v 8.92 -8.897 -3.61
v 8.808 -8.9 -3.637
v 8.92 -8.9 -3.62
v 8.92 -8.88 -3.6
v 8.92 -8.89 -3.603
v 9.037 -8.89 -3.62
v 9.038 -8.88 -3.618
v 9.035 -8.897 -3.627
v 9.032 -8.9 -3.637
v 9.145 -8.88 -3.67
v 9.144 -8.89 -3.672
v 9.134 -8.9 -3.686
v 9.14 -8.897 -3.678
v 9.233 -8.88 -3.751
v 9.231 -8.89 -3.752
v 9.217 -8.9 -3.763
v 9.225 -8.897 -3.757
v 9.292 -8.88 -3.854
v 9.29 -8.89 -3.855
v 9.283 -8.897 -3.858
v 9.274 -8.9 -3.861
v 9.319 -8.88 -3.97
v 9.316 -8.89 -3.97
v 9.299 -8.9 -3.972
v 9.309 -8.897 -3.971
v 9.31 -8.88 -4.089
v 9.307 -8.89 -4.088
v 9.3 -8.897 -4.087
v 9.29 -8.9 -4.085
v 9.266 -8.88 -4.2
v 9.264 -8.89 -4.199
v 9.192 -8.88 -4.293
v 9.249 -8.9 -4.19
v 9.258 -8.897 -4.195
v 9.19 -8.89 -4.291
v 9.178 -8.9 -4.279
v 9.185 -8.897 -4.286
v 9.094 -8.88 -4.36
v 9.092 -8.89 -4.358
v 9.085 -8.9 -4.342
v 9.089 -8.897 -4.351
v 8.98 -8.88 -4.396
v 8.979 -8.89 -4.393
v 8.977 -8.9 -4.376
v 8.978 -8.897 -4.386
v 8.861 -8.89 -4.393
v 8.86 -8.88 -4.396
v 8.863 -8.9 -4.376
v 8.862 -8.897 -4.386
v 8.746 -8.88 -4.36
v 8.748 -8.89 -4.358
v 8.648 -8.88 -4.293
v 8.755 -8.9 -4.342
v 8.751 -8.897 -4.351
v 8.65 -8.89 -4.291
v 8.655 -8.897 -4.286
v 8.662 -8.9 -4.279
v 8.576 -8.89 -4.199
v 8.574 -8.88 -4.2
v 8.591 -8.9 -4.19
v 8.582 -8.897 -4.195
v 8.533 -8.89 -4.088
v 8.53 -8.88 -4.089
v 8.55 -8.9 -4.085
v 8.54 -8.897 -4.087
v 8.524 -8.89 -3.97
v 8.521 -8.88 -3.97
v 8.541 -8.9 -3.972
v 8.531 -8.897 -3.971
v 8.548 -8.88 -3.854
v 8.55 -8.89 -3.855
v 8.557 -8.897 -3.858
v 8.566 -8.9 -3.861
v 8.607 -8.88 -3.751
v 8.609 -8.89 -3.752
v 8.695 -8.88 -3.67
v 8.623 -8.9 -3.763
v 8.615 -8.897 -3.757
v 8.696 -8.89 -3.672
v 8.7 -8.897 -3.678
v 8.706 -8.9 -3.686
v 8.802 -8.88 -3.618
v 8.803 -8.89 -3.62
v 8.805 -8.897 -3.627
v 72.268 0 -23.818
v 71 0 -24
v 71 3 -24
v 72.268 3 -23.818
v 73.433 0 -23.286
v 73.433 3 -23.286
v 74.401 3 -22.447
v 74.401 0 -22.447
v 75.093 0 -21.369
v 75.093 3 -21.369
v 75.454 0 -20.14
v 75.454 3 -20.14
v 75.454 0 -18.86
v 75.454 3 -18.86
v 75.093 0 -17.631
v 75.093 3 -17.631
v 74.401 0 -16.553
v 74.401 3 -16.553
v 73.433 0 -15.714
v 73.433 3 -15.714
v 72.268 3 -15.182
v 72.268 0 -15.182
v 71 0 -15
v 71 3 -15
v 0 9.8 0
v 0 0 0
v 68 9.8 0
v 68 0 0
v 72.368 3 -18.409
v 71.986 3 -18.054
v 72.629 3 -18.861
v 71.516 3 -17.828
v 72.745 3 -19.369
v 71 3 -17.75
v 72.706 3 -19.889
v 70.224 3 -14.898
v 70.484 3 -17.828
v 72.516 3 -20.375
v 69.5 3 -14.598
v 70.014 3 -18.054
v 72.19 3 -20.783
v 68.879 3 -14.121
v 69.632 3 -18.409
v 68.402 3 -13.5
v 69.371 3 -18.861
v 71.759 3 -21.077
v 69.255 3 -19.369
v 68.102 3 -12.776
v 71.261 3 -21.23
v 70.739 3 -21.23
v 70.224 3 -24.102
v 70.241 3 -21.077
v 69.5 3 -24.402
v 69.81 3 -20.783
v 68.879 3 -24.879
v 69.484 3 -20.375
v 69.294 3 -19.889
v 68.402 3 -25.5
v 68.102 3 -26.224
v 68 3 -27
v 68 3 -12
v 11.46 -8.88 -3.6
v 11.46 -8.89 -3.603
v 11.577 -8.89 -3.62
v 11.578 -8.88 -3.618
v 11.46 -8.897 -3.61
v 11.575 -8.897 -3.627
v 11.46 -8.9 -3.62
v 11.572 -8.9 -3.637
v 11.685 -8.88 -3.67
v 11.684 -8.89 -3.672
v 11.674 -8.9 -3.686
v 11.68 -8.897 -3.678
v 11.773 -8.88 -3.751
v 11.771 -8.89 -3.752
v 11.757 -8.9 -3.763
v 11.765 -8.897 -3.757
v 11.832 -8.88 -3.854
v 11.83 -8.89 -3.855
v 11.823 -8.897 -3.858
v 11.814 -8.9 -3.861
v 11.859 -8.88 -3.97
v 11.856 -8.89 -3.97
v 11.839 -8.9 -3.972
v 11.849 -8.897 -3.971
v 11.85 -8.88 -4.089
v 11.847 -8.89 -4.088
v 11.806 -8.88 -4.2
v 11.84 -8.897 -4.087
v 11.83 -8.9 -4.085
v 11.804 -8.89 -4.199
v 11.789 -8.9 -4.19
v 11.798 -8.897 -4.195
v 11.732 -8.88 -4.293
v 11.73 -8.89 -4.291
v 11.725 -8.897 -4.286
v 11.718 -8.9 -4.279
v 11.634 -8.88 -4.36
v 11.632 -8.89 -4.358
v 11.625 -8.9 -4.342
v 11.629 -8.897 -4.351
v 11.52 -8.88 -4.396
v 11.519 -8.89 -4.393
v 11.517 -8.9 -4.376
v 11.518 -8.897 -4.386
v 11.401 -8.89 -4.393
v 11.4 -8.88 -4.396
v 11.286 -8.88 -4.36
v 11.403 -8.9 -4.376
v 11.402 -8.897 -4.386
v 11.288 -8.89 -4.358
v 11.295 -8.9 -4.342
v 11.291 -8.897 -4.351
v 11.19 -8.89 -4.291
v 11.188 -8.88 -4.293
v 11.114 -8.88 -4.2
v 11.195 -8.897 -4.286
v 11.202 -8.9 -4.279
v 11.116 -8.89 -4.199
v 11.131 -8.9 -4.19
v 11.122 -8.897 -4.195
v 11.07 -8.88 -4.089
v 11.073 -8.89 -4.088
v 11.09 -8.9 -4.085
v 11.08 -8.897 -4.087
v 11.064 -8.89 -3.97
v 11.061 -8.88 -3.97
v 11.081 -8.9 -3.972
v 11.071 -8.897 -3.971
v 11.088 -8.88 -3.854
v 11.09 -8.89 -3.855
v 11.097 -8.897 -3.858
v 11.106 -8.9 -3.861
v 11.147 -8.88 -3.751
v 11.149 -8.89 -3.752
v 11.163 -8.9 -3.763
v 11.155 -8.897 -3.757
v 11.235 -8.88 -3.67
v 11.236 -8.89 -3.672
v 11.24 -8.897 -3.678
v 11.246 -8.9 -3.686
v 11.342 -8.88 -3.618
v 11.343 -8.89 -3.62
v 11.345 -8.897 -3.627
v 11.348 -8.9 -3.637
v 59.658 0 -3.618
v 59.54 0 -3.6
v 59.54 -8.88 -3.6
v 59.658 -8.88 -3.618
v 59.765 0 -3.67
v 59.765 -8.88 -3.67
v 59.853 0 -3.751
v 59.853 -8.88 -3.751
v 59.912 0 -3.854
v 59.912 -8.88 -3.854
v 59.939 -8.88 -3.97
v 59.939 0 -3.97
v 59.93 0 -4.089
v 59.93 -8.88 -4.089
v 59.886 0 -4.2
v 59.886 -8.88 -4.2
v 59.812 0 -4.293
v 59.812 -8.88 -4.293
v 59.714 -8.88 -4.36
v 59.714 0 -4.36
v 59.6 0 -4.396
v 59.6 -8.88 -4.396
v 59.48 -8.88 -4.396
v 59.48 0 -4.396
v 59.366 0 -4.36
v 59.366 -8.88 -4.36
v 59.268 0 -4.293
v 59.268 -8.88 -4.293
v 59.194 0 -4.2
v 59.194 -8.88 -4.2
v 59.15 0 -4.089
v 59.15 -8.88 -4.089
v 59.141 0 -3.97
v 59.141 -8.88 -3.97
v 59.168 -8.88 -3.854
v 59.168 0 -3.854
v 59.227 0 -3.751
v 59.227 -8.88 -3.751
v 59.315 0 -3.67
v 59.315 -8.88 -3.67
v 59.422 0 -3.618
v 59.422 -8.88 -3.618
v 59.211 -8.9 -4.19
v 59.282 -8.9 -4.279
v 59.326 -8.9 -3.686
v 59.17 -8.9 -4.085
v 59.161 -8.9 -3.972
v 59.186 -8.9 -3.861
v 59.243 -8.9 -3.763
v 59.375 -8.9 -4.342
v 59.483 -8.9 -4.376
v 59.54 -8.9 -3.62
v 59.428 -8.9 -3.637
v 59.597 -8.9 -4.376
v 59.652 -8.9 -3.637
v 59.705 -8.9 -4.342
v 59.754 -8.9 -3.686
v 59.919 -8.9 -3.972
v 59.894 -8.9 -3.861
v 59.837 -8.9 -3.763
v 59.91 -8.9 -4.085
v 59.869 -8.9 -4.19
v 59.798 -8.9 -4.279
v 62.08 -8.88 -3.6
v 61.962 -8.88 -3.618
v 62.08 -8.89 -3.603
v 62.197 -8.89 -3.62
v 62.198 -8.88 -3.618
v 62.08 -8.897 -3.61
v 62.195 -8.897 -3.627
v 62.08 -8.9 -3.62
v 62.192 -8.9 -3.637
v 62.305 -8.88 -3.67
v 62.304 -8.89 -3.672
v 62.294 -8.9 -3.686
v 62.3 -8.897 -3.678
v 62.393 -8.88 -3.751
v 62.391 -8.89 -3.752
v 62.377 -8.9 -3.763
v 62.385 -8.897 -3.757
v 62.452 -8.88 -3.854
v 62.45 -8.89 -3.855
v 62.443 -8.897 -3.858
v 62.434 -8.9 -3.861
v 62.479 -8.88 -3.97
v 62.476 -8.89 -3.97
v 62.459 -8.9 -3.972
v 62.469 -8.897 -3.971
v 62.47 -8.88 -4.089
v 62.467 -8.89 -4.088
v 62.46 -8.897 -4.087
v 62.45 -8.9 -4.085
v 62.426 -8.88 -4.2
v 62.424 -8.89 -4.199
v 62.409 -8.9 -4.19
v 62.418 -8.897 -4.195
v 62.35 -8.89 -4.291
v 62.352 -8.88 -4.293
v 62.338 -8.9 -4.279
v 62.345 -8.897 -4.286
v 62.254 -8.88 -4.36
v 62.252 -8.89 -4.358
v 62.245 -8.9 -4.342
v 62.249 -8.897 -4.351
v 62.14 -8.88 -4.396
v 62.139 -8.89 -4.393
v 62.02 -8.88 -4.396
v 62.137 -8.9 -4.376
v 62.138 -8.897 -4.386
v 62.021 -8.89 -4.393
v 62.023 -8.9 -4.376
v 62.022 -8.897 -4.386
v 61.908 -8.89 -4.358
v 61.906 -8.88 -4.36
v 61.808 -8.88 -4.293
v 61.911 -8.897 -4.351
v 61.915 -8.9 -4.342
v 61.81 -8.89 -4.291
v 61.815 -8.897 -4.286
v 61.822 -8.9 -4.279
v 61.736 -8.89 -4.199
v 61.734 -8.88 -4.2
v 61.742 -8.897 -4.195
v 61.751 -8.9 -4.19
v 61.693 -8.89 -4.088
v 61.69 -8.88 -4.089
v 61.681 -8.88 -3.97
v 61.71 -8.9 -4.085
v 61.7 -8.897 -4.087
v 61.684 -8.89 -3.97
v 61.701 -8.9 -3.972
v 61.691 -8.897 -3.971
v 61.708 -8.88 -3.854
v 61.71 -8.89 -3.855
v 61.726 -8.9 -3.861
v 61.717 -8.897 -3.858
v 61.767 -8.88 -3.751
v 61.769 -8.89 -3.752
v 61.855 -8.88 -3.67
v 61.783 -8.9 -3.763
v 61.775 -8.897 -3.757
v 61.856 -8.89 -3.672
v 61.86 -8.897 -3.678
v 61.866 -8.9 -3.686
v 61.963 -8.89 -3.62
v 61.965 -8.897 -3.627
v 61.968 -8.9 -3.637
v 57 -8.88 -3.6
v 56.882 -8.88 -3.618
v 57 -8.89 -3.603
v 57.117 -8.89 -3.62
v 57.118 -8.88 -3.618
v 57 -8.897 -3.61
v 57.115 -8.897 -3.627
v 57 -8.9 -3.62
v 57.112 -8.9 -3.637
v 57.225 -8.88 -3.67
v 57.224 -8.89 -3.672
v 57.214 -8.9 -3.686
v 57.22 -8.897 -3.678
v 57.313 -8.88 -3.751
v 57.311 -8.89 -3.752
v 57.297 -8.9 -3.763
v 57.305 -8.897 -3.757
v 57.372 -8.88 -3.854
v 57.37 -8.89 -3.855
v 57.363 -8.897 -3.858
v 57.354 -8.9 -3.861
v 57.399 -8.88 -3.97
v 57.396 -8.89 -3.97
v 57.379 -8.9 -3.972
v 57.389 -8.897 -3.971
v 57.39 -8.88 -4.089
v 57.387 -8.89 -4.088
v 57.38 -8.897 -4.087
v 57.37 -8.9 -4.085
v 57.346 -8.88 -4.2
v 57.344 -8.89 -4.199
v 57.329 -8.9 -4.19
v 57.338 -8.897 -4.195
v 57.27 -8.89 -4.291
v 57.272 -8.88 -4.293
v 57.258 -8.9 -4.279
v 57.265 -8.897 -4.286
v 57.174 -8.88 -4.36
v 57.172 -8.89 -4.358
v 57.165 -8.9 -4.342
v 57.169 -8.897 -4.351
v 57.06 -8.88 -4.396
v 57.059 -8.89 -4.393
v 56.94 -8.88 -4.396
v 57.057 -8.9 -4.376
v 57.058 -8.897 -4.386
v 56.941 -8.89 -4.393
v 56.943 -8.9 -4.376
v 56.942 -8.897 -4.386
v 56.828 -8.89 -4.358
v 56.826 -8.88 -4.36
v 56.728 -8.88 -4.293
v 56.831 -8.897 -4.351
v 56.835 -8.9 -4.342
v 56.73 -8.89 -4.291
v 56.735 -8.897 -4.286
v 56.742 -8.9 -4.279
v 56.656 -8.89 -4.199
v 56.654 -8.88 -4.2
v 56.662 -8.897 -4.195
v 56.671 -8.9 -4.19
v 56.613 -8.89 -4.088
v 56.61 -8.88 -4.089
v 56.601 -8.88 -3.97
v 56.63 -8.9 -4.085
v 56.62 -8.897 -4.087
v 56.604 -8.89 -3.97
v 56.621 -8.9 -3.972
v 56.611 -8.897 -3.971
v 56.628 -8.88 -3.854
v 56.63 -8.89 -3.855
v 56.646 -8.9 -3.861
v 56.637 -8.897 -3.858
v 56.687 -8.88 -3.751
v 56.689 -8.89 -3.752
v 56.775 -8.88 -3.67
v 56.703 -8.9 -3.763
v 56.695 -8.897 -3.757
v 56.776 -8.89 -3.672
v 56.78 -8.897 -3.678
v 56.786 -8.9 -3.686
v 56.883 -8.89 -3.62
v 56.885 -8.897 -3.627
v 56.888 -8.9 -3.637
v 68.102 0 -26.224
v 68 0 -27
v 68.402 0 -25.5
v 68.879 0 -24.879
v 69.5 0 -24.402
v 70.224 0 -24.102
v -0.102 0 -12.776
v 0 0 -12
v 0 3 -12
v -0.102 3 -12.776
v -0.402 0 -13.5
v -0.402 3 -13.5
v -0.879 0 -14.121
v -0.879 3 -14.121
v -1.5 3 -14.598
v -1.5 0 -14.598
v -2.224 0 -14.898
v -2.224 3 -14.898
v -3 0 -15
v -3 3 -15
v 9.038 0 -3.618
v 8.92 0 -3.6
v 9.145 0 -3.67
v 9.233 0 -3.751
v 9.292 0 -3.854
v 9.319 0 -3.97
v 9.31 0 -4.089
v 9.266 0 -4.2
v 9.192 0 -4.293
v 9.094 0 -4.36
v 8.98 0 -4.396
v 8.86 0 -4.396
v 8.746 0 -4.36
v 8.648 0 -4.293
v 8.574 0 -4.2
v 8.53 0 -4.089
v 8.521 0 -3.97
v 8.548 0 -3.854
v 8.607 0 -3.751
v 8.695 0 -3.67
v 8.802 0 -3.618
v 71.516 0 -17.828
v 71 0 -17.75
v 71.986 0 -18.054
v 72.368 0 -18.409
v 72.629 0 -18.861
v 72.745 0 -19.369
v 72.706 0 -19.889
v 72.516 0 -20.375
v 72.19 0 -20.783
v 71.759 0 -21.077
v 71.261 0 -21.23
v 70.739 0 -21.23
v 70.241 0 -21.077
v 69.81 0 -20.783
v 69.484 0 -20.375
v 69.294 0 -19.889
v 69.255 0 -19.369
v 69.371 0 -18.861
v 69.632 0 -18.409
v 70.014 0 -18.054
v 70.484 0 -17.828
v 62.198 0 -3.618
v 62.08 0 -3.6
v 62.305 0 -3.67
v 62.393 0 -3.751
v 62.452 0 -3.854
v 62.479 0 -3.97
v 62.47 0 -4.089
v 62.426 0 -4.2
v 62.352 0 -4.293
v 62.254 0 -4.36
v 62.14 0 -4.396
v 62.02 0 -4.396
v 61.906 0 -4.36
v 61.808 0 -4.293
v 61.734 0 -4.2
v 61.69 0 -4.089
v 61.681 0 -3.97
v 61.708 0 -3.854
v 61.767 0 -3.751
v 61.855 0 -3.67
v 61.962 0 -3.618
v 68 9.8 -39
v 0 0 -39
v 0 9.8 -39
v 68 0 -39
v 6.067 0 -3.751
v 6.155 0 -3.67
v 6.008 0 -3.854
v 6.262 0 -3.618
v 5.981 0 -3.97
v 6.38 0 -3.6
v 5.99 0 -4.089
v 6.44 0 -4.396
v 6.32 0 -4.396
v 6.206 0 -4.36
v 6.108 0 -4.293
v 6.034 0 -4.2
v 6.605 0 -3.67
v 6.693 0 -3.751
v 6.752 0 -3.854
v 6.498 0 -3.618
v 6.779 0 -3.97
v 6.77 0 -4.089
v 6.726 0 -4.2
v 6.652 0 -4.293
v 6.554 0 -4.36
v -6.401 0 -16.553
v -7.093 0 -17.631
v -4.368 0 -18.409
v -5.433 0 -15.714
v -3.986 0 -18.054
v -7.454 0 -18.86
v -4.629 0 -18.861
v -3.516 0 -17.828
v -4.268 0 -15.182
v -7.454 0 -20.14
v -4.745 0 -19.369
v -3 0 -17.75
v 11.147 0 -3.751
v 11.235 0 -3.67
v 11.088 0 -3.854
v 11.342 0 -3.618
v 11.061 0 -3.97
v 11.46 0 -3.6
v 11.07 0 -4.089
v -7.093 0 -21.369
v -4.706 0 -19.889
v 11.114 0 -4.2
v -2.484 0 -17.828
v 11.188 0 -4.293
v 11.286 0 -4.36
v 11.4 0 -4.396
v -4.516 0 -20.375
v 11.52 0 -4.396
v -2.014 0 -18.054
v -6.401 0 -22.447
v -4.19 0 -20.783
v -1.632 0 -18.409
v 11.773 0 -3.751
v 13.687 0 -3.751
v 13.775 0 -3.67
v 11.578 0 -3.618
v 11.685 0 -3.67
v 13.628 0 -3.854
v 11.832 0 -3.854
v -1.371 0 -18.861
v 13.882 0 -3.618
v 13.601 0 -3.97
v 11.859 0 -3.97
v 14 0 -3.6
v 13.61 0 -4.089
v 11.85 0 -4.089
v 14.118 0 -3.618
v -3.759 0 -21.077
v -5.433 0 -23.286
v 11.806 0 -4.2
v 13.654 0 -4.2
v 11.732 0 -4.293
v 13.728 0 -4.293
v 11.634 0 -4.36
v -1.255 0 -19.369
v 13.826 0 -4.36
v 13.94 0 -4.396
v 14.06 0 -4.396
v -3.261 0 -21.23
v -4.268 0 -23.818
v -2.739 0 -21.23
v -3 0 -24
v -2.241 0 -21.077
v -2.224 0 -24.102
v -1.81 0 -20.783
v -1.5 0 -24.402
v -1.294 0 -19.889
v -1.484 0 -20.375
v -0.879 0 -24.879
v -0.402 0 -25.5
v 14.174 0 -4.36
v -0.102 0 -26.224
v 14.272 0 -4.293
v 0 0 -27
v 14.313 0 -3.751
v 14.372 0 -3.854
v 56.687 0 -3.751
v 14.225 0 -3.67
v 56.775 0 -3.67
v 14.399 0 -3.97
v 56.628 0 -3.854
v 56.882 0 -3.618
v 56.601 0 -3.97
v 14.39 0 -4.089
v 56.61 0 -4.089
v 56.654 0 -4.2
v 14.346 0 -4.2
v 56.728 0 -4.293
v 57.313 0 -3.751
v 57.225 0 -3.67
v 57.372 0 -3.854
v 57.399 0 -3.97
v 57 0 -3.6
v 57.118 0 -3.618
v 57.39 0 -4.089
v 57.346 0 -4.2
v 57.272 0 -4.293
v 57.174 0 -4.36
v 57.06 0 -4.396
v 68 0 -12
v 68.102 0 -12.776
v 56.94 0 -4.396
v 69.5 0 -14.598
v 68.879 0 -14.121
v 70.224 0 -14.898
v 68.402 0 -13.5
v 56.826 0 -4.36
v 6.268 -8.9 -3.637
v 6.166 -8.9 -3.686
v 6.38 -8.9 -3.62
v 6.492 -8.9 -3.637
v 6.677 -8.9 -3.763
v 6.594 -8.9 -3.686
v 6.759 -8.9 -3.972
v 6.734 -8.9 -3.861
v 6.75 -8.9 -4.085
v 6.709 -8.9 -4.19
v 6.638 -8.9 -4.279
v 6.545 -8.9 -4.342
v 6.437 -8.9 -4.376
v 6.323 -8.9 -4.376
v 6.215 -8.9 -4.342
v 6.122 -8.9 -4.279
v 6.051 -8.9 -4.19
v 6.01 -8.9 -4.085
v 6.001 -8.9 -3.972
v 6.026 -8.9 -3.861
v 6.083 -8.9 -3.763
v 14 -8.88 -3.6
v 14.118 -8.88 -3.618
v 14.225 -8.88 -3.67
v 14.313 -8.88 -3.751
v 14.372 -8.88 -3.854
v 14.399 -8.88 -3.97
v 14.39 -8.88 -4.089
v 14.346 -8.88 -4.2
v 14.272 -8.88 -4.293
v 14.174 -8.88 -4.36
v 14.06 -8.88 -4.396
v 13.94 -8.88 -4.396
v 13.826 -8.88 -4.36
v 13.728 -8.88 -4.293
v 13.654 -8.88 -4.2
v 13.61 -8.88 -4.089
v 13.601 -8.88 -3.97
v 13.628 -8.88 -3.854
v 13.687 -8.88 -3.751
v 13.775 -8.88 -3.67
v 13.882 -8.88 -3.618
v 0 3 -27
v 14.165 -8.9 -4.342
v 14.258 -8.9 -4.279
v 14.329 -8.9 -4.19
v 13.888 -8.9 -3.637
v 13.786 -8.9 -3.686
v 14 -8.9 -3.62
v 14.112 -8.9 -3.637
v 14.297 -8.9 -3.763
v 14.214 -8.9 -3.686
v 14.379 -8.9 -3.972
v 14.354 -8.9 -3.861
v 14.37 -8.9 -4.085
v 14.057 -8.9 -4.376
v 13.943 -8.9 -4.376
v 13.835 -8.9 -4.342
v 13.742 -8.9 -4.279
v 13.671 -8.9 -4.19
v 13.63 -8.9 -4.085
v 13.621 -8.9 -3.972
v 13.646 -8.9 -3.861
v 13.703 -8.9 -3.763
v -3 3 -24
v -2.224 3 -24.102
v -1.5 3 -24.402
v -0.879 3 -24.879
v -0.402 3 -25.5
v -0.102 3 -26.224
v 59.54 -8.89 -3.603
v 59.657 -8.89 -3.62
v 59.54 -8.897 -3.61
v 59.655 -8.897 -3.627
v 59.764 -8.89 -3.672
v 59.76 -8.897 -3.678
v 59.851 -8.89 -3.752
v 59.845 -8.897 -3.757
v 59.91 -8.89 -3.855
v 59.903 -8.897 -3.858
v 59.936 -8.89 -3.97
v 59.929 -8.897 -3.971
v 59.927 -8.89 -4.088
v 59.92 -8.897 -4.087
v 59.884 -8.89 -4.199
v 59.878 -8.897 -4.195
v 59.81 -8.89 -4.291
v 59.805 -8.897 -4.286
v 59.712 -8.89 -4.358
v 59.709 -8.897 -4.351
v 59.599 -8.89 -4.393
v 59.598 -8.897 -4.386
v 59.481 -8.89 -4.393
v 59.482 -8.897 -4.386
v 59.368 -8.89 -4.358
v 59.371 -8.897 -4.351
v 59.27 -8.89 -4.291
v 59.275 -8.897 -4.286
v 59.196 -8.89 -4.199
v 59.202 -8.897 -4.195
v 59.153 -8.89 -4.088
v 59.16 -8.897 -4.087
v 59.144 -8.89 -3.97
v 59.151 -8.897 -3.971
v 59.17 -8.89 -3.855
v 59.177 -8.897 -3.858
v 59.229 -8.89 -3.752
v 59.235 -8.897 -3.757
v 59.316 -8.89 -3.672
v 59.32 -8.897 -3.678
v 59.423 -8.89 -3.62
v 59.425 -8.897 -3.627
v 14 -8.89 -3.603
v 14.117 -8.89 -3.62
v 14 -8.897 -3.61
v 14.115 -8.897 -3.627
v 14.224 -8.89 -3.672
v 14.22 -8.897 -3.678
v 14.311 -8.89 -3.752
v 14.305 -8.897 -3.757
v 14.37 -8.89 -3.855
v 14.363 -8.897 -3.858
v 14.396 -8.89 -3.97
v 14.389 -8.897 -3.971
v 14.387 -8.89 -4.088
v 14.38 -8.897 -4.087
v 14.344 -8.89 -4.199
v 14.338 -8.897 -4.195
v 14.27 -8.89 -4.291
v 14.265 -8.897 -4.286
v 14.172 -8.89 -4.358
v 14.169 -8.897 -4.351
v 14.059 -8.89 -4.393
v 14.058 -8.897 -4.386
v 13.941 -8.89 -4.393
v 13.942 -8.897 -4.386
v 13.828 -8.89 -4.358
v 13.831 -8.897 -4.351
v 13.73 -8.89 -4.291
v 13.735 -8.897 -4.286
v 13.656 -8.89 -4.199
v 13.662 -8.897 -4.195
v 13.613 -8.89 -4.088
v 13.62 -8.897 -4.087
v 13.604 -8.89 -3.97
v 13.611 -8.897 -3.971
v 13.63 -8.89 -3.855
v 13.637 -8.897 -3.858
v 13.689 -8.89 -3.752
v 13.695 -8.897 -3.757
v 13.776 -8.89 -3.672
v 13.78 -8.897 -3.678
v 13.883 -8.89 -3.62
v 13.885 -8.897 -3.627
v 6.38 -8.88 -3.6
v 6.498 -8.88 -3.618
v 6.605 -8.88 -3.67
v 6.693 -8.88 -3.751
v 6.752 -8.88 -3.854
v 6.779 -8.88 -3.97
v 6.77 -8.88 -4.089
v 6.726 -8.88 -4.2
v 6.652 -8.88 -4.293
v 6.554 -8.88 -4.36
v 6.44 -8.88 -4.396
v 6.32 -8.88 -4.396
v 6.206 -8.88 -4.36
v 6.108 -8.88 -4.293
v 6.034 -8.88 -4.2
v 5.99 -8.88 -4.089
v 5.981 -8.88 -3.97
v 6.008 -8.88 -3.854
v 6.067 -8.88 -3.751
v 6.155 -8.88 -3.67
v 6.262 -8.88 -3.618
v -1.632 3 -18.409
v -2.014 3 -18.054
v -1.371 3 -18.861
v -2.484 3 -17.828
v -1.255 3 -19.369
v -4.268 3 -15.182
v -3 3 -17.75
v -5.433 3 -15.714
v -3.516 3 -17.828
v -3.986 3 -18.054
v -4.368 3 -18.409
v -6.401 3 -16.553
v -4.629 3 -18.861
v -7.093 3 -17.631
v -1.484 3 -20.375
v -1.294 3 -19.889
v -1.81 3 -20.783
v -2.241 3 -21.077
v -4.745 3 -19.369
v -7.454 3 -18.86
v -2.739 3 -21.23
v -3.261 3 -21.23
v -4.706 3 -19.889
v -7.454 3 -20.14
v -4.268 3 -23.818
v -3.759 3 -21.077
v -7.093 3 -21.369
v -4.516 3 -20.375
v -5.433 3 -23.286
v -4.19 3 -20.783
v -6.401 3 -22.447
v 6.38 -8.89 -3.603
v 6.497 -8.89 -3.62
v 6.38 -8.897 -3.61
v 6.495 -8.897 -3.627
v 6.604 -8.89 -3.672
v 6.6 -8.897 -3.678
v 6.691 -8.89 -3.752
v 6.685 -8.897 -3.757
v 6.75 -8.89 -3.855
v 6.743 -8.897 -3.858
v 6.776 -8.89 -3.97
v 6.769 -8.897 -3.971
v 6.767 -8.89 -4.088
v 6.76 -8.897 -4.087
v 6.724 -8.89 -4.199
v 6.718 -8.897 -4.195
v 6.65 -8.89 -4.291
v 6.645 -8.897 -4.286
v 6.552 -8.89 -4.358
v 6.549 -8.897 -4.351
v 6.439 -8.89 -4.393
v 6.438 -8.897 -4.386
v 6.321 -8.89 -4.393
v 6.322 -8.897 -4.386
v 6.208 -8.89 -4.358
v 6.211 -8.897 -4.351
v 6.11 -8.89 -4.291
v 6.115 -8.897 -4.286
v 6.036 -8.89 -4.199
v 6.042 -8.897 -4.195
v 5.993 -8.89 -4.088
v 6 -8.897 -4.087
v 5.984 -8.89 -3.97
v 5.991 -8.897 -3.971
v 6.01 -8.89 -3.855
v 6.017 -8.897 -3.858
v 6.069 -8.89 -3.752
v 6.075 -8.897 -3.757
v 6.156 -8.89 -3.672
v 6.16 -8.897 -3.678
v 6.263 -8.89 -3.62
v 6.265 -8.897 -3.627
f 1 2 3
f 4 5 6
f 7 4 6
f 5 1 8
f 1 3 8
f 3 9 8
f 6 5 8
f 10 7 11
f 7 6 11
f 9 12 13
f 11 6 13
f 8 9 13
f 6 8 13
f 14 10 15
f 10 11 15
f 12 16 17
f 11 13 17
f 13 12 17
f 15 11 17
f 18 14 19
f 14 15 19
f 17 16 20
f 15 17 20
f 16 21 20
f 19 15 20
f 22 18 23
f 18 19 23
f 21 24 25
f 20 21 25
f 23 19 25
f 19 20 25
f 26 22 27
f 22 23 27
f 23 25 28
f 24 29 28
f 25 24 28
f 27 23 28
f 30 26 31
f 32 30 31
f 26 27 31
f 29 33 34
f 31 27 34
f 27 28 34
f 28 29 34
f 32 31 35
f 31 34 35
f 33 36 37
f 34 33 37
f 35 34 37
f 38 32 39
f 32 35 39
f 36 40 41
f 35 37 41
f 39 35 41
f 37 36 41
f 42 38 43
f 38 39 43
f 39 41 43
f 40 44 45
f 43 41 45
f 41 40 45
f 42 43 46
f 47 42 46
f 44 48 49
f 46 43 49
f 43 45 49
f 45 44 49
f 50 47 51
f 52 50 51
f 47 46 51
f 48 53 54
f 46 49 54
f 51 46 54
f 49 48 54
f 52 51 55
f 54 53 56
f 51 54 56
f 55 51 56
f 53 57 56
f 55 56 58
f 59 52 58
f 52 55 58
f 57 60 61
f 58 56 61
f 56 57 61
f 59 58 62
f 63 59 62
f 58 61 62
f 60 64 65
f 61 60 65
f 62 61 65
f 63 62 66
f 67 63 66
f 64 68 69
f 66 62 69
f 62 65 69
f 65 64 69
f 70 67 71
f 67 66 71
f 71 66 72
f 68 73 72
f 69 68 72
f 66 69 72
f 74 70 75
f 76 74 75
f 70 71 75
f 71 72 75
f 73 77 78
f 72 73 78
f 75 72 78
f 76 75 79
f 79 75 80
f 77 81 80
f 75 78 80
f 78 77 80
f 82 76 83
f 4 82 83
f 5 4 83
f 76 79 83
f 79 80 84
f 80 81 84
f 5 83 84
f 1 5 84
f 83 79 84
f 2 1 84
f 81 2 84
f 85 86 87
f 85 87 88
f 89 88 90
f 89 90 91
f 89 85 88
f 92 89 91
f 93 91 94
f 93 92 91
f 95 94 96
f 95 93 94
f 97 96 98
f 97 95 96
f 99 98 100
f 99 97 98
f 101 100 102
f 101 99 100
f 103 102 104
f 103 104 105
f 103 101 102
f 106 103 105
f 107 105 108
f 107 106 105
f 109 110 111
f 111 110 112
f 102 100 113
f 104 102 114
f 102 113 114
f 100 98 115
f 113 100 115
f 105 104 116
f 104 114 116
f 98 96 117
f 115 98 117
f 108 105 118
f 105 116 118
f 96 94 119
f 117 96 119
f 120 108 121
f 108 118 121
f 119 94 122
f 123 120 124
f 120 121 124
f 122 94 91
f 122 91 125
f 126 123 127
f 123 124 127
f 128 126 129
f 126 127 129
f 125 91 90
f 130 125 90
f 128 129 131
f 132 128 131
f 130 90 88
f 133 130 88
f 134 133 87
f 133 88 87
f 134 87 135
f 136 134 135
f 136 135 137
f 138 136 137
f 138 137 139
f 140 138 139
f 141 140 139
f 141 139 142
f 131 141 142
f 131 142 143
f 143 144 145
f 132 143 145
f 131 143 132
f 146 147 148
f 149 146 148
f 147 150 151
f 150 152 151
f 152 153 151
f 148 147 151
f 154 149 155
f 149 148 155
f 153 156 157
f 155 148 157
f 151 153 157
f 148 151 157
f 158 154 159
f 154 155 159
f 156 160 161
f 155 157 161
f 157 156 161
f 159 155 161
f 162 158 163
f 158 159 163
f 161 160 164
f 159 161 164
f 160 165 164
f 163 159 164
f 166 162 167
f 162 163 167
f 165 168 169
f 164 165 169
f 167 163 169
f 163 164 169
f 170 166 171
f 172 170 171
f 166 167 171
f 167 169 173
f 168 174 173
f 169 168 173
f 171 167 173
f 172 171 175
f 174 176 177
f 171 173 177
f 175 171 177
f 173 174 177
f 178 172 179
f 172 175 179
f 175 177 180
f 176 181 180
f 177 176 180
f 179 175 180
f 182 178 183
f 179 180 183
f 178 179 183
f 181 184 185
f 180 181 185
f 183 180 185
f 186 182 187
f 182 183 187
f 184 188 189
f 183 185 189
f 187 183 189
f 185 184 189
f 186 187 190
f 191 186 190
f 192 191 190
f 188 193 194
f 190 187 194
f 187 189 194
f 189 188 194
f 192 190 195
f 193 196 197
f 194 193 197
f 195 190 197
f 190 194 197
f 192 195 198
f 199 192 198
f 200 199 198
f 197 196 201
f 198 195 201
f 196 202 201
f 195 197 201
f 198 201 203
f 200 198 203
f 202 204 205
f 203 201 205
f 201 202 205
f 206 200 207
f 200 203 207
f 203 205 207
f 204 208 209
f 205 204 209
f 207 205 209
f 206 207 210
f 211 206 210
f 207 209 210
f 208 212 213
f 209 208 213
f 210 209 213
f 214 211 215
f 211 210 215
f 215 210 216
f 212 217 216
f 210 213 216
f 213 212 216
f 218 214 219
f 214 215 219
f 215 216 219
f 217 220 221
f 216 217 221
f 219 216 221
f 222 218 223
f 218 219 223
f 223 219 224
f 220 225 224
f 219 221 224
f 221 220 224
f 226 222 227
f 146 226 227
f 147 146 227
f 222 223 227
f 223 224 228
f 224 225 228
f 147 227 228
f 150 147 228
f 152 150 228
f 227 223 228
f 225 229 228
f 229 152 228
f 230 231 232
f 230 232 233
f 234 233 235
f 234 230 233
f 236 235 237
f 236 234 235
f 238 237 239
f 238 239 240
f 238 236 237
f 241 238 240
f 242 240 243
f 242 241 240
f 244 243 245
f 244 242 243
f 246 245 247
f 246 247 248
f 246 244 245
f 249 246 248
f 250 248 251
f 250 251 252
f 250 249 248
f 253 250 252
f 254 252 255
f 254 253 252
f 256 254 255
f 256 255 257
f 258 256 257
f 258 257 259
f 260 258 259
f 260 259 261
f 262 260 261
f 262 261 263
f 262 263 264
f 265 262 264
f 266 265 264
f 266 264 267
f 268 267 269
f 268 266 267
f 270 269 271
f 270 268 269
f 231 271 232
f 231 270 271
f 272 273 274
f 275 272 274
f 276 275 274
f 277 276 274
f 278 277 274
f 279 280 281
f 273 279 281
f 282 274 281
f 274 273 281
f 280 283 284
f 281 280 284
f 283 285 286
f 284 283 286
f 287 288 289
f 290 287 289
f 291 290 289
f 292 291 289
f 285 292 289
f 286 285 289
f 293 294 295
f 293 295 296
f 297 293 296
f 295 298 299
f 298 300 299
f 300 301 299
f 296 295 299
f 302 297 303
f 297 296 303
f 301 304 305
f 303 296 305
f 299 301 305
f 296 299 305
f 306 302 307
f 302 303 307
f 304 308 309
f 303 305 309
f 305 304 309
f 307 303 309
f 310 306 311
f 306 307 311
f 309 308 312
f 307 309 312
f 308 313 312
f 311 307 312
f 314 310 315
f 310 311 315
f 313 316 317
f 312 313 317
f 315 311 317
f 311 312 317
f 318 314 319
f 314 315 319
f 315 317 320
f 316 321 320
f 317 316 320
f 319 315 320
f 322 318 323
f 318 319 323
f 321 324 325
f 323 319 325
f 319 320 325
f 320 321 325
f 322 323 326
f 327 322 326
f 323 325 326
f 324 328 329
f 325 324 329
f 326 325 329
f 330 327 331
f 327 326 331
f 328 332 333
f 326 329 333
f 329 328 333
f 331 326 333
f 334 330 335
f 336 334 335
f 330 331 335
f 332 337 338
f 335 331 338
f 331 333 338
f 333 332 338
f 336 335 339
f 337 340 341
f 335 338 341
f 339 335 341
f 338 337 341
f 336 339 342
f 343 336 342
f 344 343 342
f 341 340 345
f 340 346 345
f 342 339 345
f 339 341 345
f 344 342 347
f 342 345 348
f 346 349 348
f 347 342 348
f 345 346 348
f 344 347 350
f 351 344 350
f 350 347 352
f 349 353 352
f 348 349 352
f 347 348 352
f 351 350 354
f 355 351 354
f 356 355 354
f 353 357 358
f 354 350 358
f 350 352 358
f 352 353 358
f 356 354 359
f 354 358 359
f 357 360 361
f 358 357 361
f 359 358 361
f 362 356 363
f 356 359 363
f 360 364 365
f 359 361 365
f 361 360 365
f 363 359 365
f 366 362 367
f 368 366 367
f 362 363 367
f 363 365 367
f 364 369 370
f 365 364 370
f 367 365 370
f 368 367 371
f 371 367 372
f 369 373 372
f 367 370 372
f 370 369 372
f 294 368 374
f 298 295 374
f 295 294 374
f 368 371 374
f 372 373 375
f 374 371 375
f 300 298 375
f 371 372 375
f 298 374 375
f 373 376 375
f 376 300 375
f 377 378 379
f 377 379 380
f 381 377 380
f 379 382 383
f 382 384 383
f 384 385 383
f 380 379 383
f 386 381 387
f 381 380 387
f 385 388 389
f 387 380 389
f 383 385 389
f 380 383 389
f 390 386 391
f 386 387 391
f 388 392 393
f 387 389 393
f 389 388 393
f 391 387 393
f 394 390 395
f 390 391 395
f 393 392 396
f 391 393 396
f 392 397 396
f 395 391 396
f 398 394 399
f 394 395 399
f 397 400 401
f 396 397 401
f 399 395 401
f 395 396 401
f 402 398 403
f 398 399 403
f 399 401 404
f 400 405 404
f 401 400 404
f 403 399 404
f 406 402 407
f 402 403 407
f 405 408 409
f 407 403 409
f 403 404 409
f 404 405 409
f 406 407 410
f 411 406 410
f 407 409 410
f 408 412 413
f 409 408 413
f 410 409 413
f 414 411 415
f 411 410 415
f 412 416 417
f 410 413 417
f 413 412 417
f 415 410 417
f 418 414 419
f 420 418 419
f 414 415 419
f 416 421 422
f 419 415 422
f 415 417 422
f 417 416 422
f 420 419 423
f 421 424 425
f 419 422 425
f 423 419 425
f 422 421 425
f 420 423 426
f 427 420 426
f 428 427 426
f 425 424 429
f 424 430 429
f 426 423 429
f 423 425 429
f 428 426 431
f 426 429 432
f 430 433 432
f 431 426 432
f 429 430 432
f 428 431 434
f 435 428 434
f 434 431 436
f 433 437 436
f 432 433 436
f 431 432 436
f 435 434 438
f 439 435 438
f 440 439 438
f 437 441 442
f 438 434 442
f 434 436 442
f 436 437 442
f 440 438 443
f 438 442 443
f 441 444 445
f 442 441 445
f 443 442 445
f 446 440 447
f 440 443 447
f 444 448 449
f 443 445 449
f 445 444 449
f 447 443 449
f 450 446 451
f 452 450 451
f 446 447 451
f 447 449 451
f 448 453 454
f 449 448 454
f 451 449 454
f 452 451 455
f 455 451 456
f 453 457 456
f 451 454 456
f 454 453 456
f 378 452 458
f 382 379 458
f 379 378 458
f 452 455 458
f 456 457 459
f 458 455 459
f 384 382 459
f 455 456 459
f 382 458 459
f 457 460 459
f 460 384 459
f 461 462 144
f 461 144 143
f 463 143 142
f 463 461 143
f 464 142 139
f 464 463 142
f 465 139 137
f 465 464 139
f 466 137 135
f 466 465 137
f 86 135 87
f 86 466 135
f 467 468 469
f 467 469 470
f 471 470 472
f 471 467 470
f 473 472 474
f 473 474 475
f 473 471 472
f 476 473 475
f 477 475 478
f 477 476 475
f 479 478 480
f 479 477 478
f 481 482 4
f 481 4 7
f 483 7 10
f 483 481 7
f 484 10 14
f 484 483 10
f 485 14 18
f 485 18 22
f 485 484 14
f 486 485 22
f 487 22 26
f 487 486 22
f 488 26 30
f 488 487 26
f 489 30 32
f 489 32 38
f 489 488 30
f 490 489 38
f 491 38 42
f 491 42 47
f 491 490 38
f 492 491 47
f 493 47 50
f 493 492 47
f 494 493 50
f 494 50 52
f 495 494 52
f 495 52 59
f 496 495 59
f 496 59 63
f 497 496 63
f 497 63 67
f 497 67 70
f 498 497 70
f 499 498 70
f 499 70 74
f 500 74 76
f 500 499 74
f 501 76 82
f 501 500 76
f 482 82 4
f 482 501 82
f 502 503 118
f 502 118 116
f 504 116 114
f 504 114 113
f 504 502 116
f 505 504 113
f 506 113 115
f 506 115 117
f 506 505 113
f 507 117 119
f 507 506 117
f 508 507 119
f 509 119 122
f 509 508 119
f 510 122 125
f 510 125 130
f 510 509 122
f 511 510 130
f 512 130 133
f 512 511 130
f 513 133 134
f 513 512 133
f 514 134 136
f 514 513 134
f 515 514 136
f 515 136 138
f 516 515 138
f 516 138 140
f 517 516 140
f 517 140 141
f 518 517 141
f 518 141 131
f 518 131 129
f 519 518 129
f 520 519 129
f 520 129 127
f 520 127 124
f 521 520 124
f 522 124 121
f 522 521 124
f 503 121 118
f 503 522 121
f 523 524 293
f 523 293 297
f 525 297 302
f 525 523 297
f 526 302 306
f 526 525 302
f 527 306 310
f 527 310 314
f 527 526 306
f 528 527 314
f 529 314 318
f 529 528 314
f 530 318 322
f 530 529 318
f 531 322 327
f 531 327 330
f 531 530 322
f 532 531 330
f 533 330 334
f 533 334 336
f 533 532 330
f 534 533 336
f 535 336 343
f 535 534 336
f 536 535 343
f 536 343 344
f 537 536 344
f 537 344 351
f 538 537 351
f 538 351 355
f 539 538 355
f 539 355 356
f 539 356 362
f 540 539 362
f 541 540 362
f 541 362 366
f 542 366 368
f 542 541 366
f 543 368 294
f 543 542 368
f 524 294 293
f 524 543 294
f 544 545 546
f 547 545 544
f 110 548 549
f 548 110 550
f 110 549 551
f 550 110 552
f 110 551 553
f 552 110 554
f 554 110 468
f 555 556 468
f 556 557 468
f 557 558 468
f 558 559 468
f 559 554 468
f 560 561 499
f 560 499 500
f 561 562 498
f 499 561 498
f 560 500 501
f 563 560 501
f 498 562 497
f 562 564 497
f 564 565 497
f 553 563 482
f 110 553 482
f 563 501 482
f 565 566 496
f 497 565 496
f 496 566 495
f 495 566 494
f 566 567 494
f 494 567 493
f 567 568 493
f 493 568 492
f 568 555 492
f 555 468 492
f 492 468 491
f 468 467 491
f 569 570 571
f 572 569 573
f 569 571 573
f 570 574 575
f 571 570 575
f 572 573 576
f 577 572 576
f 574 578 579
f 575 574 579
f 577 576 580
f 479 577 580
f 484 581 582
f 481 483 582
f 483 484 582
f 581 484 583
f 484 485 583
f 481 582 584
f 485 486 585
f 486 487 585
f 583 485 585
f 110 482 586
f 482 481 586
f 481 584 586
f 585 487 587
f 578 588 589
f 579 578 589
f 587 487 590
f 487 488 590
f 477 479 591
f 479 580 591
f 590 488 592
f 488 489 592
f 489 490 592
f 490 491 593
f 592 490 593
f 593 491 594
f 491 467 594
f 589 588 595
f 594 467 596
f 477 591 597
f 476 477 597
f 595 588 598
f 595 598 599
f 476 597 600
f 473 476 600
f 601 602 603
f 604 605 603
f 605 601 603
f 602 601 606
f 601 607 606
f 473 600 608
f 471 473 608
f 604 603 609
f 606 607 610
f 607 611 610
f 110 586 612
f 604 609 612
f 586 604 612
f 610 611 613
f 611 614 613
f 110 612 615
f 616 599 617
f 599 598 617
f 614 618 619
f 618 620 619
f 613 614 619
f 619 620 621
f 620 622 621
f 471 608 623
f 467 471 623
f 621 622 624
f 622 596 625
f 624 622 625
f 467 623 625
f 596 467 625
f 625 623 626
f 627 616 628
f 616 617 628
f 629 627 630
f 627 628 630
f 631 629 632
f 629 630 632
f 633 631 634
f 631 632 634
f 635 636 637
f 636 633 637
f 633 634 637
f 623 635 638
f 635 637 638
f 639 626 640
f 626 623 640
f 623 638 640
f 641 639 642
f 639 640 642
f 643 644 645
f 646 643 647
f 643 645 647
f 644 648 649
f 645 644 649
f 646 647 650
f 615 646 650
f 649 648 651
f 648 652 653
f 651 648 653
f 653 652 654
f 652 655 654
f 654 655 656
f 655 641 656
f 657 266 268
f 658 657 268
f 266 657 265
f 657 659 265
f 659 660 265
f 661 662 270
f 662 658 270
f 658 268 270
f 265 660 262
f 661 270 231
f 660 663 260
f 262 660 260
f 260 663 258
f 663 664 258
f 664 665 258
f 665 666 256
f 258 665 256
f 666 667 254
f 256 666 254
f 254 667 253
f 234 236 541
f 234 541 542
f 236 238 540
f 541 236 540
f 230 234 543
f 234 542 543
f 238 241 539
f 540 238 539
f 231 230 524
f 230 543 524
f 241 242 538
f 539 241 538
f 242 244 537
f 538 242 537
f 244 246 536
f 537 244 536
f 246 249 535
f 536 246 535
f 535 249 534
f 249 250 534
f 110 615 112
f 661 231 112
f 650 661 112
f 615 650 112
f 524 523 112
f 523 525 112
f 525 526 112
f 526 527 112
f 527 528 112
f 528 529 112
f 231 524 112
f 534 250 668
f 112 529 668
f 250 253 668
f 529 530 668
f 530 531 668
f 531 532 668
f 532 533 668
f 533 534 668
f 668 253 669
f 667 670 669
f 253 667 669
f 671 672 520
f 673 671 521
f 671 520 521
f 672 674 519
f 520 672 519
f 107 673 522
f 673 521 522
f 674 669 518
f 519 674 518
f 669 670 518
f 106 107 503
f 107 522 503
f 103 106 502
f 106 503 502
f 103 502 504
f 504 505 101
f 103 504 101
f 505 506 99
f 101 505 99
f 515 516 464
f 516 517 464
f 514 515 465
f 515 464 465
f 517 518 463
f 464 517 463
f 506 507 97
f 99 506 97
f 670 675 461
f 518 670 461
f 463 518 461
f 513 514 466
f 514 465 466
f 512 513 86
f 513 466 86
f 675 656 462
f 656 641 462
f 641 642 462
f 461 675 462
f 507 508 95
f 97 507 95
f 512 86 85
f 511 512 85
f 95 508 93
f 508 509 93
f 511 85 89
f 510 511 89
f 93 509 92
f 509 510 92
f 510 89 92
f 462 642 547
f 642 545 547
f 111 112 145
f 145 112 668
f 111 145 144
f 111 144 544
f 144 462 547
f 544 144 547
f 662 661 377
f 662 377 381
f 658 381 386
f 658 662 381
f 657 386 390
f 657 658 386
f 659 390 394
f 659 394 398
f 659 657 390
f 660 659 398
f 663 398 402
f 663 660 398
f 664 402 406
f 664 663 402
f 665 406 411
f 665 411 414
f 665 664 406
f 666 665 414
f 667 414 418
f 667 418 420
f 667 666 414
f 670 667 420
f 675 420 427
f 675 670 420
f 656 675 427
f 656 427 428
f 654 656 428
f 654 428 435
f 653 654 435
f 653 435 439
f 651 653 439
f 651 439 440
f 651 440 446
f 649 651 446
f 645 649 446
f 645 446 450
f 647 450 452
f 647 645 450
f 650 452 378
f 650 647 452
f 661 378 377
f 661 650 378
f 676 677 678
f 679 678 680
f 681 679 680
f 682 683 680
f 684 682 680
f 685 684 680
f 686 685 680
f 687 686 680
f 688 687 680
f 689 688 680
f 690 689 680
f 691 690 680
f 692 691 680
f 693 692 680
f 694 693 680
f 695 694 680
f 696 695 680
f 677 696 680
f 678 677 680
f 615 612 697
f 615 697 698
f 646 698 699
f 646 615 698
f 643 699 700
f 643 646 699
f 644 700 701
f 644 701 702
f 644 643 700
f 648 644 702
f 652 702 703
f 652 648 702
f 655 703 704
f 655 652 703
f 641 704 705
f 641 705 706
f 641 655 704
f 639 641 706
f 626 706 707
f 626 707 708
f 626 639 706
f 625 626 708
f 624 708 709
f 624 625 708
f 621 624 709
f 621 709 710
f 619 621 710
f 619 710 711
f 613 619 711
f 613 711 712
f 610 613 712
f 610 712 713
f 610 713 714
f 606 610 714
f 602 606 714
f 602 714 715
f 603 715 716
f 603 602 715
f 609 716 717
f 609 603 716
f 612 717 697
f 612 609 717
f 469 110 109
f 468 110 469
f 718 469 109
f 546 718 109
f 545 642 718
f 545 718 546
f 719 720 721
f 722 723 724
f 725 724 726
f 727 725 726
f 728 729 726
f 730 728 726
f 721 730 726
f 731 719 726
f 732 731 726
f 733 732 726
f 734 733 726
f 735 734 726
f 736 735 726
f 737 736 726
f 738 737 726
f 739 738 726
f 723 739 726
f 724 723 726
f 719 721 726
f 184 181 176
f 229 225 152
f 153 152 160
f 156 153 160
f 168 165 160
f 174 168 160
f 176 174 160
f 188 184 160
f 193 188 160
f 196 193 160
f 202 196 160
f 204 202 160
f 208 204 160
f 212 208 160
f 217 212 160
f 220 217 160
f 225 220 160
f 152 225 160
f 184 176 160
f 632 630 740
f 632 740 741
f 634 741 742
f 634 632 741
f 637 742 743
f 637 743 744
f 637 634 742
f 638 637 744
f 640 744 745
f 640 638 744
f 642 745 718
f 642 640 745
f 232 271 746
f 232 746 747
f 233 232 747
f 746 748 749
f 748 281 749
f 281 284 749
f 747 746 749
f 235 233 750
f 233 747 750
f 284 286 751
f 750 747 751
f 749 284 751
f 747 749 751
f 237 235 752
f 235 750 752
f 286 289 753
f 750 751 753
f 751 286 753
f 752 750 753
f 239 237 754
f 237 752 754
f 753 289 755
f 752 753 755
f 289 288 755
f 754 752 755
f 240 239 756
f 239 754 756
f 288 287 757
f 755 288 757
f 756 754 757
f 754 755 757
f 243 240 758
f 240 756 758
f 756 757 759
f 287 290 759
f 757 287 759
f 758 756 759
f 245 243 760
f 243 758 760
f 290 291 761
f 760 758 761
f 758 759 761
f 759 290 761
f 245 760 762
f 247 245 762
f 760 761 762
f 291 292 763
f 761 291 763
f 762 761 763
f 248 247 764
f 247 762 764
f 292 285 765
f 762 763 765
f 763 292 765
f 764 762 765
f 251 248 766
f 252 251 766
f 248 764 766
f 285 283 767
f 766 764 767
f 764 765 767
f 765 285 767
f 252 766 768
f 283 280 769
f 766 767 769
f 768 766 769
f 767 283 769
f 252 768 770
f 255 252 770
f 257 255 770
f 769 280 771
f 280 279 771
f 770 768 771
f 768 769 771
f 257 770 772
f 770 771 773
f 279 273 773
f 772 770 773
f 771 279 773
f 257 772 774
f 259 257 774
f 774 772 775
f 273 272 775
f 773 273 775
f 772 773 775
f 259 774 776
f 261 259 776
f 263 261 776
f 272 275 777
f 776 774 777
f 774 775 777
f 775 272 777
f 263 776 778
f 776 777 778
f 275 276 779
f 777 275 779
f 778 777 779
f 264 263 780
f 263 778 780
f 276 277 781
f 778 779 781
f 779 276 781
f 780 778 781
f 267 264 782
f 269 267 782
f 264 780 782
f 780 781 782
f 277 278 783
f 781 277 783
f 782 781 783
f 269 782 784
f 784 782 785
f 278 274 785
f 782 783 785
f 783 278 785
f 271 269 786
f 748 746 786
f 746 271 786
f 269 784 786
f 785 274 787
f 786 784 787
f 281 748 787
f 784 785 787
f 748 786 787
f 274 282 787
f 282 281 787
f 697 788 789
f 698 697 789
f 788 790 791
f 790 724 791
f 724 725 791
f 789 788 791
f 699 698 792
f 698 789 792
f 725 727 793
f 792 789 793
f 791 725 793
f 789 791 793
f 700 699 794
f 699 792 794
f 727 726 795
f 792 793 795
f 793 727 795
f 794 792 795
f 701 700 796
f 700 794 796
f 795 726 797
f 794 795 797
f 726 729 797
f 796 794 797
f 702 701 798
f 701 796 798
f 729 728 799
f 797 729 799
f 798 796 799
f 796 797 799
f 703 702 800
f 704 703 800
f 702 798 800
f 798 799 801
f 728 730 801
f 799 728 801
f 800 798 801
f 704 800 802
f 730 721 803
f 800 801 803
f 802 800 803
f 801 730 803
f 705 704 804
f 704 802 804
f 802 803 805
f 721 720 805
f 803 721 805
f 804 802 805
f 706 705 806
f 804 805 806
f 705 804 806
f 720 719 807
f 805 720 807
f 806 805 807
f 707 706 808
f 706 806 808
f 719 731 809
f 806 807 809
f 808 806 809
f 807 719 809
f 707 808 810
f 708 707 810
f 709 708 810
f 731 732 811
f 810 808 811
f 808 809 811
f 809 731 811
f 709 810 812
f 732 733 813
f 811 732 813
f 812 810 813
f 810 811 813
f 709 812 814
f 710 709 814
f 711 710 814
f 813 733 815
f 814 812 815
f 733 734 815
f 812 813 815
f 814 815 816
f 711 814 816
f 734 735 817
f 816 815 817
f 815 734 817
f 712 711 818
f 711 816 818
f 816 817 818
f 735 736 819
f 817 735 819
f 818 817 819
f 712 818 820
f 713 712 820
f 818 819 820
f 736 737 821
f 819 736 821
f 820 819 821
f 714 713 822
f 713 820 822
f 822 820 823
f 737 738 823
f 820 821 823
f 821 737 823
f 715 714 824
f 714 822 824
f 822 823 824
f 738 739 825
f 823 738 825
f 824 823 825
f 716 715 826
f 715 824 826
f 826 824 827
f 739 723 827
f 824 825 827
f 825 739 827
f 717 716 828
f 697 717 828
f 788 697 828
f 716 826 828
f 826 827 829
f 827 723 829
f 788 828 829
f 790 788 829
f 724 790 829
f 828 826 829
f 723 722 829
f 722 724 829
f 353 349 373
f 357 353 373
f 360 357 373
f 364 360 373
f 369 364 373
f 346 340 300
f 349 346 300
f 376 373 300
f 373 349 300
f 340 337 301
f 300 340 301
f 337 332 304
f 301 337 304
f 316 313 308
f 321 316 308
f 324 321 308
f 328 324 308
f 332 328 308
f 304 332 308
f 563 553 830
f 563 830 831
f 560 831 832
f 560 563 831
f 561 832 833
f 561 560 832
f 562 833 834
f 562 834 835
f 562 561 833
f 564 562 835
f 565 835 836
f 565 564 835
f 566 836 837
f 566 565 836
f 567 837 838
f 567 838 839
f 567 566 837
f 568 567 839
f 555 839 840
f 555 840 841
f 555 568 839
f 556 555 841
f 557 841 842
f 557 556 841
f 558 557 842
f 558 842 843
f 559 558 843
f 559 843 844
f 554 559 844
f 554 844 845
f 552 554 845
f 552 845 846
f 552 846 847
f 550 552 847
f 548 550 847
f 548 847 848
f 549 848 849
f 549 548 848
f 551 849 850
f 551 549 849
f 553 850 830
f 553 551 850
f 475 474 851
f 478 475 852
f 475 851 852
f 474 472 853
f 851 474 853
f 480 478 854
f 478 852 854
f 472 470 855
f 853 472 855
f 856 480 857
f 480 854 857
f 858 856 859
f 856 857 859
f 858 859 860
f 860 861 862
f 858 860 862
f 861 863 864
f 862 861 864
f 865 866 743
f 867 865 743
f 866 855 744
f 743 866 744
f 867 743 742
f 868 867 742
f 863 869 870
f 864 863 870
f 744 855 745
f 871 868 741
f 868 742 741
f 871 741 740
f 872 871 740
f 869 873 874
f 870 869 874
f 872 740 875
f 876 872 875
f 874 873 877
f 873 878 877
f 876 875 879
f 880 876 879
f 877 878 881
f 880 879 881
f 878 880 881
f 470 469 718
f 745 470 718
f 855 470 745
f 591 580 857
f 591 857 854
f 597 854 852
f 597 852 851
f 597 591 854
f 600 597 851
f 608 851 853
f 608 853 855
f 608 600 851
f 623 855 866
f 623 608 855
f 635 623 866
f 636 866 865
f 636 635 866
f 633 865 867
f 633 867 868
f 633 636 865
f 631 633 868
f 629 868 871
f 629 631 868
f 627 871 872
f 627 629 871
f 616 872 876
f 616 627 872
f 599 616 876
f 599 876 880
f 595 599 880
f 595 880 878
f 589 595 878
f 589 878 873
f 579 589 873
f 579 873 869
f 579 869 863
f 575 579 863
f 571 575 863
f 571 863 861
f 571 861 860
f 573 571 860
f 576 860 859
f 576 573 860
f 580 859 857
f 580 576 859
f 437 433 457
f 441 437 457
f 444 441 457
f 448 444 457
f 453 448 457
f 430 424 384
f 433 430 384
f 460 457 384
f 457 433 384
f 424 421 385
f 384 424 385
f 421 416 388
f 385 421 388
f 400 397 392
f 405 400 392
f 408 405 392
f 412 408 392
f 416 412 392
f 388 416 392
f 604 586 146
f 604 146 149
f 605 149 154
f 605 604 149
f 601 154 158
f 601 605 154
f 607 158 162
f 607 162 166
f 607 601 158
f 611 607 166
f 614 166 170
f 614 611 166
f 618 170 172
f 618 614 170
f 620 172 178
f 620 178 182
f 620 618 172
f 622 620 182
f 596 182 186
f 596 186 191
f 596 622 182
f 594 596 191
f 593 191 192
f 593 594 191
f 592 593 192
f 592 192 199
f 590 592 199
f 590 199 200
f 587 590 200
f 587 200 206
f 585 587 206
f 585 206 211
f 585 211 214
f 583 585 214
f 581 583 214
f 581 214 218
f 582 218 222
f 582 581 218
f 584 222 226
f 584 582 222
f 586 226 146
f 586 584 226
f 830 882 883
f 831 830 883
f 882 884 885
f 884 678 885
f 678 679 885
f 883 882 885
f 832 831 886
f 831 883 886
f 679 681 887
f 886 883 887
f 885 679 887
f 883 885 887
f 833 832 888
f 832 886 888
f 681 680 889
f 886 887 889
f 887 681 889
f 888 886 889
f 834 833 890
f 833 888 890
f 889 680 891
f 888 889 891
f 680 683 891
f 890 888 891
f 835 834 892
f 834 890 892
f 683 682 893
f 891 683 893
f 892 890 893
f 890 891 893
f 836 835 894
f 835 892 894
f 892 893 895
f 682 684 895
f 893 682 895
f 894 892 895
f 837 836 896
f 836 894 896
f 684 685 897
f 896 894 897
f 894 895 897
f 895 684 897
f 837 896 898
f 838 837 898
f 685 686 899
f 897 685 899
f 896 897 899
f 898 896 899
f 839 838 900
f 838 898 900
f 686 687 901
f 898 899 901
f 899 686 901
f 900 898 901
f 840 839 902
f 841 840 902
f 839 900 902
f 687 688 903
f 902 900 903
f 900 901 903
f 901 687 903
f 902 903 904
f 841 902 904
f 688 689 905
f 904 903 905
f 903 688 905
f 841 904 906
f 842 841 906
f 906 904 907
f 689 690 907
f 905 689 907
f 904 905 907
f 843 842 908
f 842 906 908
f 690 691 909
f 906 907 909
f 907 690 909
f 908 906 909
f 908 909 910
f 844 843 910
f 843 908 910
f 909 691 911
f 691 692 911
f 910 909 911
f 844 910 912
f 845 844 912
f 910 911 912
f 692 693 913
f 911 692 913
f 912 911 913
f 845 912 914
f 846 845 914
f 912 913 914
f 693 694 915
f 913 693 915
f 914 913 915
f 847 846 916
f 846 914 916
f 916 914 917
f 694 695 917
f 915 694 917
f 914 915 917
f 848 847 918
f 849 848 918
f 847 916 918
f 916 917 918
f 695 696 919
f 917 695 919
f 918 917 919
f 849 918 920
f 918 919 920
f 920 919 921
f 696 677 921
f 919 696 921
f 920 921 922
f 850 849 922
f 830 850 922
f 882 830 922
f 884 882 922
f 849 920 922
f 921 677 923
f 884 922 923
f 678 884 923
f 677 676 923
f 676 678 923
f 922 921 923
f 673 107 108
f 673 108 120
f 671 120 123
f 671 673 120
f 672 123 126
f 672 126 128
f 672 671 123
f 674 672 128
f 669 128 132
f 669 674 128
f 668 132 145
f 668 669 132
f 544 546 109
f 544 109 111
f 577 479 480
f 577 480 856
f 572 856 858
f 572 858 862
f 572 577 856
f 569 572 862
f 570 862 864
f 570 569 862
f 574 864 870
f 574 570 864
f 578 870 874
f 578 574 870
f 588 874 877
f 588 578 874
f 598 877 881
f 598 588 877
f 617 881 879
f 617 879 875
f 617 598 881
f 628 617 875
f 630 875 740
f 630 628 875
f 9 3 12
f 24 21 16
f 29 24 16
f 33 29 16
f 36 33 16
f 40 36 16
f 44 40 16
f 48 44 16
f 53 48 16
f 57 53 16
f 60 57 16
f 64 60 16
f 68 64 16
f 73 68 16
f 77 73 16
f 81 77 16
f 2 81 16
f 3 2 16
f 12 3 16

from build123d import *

# Parameters (mm, degrees)
ESQUISSE1_W        = 68
ESQUISSE1_H        = 39
BOSS_EXTRU_3_DEPTH = 9.8
ESQUISSE5_R        = 1.75
BOSS_EXTRU_5_DEPTH = 3
ESQUISSE6_R        = 1.75
BOSS_EXTRU_6_DEPTH = 3
ESQUISSE7_R        = 0.4
BOSS_EXTRU_7_DEPTH = 8.9
CONG_1_R           = 0.02


with BuildPart() as part:
    # Esquisse1 → Boss.-Extru.3 (new body)
    with BuildSketch(Plane(origin=(0, 0, 0), x_dir=(1, 0, 0), z_dir=(0, 1, 0))):
        with Locations((34, 19.5)):
            Rectangle(ESQUISSE1_W, ESQUISSE1_H)
    extrude(amount=BOSS_EXTRU_3_DEPTH)

    # Esquisse5 → Boss.-Extru.5 (add)
    with BuildSketch(Plane(origin=(0, 0, 0), x_dir=(1, 0, 0), z_dir=(0, 1, 0))):
        with BuildLine():
            Line((0, 27), (0, 12))
            ThreePointArc((0, 12), (-0.878679656, 14.121320344), (-3, 15))
            ThreePointArc((-3, 15), (-7.5, 19.5), (-3, 24))
            ThreePointArc((-3, 24), (-0.878679656, 24.878679656), (0, 27))
        make_face()
        with Locations(Location((-3, 19.5, 0), (0, 0, 270))):
            Circle(ESQUISSE5_R, mode=Mode.SUBTRACT)
    extrude(amount=BOSS_EXTRU_5_DEPTH)

    # Esquisse6 → Boss.-Extru.6 (add)
    with BuildSketch(Plane(origin=(0, 0, 0), x_dir=(1, 0, 0), z_dir=(0, 1, 0))):
        with BuildLine():
            Line((68, 12), (68, 27))
            ThreePointArc((68, 27), (68.878679656, 24.878679656), (71, 24))
            ThreePointArc((71, 24), (75.5, 19.5), (71, 15))
            ThreePointArc((71, 15), (68.878679656, 14.121320344), (68, 12))
        make_face()
        with Locations(Location((71, 19.5, 0), (0, 0, 270))):
            Circle(ESQUISSE6_R, mode=Mode.SUBTRACT)
    extrude(amount=BOSS_EXTRU_6_DEPTH)

    # Esquisse7 → Boss.-Extru.7 (add)
    with BuildSketch(Plane(origin=(0, 0, 0), x_dir=(1, 0, 0), z_dir=(0, 1, 0))):
        with Locations(Location((14, 4, 0), (0, 0, 270))):
            Circle(ESQUISSE7_R)
        with Locations(Location((11.46, 4, 0), (0, 0, 270))):
            Circle(ESQUISSE7_R)
        with Locations(Location((8.92, 4, 0), (0, 0, 270))):
            Circle(ESQUISSE7_R)
        with Locations(Location((6.38, 4, 0), (0, 0, 270))):
            Circle(ESQUISSE7_R)
        with Locations(Location((57, 4, 0), (0, 0, 270))):
            Circle(ESQUISSE7_R)
        with Locations(Location((59.54, 4, 0), (0, 0, 270))):
            Circle(ESQUISSE7_R)
        with Locations(Location((62.08, 4, 0), (0, 0, 270))):
            Circle(ESQUISSE7_R)
    extrude(amount=-BOSS_EXTRU_7_DEPTH)

    # Congé1
    cong_1_edges = [part.edges().sort_by_distance(p)[0] for p in [
        (14, -8.9, -4.4),
        (57, -8.9, -4.4),
        (11.46, -8.9, -4.4),
        (8.92, -8.9, -4.4),
        (6.38, -8.9, -4.4),
        (59.54, -8.9, -4.4),
        (62.08, -8.9, -4.4),
    ]]
    fillet(cong_1_edges, radius=CONG_1_R)


solid = part.part
